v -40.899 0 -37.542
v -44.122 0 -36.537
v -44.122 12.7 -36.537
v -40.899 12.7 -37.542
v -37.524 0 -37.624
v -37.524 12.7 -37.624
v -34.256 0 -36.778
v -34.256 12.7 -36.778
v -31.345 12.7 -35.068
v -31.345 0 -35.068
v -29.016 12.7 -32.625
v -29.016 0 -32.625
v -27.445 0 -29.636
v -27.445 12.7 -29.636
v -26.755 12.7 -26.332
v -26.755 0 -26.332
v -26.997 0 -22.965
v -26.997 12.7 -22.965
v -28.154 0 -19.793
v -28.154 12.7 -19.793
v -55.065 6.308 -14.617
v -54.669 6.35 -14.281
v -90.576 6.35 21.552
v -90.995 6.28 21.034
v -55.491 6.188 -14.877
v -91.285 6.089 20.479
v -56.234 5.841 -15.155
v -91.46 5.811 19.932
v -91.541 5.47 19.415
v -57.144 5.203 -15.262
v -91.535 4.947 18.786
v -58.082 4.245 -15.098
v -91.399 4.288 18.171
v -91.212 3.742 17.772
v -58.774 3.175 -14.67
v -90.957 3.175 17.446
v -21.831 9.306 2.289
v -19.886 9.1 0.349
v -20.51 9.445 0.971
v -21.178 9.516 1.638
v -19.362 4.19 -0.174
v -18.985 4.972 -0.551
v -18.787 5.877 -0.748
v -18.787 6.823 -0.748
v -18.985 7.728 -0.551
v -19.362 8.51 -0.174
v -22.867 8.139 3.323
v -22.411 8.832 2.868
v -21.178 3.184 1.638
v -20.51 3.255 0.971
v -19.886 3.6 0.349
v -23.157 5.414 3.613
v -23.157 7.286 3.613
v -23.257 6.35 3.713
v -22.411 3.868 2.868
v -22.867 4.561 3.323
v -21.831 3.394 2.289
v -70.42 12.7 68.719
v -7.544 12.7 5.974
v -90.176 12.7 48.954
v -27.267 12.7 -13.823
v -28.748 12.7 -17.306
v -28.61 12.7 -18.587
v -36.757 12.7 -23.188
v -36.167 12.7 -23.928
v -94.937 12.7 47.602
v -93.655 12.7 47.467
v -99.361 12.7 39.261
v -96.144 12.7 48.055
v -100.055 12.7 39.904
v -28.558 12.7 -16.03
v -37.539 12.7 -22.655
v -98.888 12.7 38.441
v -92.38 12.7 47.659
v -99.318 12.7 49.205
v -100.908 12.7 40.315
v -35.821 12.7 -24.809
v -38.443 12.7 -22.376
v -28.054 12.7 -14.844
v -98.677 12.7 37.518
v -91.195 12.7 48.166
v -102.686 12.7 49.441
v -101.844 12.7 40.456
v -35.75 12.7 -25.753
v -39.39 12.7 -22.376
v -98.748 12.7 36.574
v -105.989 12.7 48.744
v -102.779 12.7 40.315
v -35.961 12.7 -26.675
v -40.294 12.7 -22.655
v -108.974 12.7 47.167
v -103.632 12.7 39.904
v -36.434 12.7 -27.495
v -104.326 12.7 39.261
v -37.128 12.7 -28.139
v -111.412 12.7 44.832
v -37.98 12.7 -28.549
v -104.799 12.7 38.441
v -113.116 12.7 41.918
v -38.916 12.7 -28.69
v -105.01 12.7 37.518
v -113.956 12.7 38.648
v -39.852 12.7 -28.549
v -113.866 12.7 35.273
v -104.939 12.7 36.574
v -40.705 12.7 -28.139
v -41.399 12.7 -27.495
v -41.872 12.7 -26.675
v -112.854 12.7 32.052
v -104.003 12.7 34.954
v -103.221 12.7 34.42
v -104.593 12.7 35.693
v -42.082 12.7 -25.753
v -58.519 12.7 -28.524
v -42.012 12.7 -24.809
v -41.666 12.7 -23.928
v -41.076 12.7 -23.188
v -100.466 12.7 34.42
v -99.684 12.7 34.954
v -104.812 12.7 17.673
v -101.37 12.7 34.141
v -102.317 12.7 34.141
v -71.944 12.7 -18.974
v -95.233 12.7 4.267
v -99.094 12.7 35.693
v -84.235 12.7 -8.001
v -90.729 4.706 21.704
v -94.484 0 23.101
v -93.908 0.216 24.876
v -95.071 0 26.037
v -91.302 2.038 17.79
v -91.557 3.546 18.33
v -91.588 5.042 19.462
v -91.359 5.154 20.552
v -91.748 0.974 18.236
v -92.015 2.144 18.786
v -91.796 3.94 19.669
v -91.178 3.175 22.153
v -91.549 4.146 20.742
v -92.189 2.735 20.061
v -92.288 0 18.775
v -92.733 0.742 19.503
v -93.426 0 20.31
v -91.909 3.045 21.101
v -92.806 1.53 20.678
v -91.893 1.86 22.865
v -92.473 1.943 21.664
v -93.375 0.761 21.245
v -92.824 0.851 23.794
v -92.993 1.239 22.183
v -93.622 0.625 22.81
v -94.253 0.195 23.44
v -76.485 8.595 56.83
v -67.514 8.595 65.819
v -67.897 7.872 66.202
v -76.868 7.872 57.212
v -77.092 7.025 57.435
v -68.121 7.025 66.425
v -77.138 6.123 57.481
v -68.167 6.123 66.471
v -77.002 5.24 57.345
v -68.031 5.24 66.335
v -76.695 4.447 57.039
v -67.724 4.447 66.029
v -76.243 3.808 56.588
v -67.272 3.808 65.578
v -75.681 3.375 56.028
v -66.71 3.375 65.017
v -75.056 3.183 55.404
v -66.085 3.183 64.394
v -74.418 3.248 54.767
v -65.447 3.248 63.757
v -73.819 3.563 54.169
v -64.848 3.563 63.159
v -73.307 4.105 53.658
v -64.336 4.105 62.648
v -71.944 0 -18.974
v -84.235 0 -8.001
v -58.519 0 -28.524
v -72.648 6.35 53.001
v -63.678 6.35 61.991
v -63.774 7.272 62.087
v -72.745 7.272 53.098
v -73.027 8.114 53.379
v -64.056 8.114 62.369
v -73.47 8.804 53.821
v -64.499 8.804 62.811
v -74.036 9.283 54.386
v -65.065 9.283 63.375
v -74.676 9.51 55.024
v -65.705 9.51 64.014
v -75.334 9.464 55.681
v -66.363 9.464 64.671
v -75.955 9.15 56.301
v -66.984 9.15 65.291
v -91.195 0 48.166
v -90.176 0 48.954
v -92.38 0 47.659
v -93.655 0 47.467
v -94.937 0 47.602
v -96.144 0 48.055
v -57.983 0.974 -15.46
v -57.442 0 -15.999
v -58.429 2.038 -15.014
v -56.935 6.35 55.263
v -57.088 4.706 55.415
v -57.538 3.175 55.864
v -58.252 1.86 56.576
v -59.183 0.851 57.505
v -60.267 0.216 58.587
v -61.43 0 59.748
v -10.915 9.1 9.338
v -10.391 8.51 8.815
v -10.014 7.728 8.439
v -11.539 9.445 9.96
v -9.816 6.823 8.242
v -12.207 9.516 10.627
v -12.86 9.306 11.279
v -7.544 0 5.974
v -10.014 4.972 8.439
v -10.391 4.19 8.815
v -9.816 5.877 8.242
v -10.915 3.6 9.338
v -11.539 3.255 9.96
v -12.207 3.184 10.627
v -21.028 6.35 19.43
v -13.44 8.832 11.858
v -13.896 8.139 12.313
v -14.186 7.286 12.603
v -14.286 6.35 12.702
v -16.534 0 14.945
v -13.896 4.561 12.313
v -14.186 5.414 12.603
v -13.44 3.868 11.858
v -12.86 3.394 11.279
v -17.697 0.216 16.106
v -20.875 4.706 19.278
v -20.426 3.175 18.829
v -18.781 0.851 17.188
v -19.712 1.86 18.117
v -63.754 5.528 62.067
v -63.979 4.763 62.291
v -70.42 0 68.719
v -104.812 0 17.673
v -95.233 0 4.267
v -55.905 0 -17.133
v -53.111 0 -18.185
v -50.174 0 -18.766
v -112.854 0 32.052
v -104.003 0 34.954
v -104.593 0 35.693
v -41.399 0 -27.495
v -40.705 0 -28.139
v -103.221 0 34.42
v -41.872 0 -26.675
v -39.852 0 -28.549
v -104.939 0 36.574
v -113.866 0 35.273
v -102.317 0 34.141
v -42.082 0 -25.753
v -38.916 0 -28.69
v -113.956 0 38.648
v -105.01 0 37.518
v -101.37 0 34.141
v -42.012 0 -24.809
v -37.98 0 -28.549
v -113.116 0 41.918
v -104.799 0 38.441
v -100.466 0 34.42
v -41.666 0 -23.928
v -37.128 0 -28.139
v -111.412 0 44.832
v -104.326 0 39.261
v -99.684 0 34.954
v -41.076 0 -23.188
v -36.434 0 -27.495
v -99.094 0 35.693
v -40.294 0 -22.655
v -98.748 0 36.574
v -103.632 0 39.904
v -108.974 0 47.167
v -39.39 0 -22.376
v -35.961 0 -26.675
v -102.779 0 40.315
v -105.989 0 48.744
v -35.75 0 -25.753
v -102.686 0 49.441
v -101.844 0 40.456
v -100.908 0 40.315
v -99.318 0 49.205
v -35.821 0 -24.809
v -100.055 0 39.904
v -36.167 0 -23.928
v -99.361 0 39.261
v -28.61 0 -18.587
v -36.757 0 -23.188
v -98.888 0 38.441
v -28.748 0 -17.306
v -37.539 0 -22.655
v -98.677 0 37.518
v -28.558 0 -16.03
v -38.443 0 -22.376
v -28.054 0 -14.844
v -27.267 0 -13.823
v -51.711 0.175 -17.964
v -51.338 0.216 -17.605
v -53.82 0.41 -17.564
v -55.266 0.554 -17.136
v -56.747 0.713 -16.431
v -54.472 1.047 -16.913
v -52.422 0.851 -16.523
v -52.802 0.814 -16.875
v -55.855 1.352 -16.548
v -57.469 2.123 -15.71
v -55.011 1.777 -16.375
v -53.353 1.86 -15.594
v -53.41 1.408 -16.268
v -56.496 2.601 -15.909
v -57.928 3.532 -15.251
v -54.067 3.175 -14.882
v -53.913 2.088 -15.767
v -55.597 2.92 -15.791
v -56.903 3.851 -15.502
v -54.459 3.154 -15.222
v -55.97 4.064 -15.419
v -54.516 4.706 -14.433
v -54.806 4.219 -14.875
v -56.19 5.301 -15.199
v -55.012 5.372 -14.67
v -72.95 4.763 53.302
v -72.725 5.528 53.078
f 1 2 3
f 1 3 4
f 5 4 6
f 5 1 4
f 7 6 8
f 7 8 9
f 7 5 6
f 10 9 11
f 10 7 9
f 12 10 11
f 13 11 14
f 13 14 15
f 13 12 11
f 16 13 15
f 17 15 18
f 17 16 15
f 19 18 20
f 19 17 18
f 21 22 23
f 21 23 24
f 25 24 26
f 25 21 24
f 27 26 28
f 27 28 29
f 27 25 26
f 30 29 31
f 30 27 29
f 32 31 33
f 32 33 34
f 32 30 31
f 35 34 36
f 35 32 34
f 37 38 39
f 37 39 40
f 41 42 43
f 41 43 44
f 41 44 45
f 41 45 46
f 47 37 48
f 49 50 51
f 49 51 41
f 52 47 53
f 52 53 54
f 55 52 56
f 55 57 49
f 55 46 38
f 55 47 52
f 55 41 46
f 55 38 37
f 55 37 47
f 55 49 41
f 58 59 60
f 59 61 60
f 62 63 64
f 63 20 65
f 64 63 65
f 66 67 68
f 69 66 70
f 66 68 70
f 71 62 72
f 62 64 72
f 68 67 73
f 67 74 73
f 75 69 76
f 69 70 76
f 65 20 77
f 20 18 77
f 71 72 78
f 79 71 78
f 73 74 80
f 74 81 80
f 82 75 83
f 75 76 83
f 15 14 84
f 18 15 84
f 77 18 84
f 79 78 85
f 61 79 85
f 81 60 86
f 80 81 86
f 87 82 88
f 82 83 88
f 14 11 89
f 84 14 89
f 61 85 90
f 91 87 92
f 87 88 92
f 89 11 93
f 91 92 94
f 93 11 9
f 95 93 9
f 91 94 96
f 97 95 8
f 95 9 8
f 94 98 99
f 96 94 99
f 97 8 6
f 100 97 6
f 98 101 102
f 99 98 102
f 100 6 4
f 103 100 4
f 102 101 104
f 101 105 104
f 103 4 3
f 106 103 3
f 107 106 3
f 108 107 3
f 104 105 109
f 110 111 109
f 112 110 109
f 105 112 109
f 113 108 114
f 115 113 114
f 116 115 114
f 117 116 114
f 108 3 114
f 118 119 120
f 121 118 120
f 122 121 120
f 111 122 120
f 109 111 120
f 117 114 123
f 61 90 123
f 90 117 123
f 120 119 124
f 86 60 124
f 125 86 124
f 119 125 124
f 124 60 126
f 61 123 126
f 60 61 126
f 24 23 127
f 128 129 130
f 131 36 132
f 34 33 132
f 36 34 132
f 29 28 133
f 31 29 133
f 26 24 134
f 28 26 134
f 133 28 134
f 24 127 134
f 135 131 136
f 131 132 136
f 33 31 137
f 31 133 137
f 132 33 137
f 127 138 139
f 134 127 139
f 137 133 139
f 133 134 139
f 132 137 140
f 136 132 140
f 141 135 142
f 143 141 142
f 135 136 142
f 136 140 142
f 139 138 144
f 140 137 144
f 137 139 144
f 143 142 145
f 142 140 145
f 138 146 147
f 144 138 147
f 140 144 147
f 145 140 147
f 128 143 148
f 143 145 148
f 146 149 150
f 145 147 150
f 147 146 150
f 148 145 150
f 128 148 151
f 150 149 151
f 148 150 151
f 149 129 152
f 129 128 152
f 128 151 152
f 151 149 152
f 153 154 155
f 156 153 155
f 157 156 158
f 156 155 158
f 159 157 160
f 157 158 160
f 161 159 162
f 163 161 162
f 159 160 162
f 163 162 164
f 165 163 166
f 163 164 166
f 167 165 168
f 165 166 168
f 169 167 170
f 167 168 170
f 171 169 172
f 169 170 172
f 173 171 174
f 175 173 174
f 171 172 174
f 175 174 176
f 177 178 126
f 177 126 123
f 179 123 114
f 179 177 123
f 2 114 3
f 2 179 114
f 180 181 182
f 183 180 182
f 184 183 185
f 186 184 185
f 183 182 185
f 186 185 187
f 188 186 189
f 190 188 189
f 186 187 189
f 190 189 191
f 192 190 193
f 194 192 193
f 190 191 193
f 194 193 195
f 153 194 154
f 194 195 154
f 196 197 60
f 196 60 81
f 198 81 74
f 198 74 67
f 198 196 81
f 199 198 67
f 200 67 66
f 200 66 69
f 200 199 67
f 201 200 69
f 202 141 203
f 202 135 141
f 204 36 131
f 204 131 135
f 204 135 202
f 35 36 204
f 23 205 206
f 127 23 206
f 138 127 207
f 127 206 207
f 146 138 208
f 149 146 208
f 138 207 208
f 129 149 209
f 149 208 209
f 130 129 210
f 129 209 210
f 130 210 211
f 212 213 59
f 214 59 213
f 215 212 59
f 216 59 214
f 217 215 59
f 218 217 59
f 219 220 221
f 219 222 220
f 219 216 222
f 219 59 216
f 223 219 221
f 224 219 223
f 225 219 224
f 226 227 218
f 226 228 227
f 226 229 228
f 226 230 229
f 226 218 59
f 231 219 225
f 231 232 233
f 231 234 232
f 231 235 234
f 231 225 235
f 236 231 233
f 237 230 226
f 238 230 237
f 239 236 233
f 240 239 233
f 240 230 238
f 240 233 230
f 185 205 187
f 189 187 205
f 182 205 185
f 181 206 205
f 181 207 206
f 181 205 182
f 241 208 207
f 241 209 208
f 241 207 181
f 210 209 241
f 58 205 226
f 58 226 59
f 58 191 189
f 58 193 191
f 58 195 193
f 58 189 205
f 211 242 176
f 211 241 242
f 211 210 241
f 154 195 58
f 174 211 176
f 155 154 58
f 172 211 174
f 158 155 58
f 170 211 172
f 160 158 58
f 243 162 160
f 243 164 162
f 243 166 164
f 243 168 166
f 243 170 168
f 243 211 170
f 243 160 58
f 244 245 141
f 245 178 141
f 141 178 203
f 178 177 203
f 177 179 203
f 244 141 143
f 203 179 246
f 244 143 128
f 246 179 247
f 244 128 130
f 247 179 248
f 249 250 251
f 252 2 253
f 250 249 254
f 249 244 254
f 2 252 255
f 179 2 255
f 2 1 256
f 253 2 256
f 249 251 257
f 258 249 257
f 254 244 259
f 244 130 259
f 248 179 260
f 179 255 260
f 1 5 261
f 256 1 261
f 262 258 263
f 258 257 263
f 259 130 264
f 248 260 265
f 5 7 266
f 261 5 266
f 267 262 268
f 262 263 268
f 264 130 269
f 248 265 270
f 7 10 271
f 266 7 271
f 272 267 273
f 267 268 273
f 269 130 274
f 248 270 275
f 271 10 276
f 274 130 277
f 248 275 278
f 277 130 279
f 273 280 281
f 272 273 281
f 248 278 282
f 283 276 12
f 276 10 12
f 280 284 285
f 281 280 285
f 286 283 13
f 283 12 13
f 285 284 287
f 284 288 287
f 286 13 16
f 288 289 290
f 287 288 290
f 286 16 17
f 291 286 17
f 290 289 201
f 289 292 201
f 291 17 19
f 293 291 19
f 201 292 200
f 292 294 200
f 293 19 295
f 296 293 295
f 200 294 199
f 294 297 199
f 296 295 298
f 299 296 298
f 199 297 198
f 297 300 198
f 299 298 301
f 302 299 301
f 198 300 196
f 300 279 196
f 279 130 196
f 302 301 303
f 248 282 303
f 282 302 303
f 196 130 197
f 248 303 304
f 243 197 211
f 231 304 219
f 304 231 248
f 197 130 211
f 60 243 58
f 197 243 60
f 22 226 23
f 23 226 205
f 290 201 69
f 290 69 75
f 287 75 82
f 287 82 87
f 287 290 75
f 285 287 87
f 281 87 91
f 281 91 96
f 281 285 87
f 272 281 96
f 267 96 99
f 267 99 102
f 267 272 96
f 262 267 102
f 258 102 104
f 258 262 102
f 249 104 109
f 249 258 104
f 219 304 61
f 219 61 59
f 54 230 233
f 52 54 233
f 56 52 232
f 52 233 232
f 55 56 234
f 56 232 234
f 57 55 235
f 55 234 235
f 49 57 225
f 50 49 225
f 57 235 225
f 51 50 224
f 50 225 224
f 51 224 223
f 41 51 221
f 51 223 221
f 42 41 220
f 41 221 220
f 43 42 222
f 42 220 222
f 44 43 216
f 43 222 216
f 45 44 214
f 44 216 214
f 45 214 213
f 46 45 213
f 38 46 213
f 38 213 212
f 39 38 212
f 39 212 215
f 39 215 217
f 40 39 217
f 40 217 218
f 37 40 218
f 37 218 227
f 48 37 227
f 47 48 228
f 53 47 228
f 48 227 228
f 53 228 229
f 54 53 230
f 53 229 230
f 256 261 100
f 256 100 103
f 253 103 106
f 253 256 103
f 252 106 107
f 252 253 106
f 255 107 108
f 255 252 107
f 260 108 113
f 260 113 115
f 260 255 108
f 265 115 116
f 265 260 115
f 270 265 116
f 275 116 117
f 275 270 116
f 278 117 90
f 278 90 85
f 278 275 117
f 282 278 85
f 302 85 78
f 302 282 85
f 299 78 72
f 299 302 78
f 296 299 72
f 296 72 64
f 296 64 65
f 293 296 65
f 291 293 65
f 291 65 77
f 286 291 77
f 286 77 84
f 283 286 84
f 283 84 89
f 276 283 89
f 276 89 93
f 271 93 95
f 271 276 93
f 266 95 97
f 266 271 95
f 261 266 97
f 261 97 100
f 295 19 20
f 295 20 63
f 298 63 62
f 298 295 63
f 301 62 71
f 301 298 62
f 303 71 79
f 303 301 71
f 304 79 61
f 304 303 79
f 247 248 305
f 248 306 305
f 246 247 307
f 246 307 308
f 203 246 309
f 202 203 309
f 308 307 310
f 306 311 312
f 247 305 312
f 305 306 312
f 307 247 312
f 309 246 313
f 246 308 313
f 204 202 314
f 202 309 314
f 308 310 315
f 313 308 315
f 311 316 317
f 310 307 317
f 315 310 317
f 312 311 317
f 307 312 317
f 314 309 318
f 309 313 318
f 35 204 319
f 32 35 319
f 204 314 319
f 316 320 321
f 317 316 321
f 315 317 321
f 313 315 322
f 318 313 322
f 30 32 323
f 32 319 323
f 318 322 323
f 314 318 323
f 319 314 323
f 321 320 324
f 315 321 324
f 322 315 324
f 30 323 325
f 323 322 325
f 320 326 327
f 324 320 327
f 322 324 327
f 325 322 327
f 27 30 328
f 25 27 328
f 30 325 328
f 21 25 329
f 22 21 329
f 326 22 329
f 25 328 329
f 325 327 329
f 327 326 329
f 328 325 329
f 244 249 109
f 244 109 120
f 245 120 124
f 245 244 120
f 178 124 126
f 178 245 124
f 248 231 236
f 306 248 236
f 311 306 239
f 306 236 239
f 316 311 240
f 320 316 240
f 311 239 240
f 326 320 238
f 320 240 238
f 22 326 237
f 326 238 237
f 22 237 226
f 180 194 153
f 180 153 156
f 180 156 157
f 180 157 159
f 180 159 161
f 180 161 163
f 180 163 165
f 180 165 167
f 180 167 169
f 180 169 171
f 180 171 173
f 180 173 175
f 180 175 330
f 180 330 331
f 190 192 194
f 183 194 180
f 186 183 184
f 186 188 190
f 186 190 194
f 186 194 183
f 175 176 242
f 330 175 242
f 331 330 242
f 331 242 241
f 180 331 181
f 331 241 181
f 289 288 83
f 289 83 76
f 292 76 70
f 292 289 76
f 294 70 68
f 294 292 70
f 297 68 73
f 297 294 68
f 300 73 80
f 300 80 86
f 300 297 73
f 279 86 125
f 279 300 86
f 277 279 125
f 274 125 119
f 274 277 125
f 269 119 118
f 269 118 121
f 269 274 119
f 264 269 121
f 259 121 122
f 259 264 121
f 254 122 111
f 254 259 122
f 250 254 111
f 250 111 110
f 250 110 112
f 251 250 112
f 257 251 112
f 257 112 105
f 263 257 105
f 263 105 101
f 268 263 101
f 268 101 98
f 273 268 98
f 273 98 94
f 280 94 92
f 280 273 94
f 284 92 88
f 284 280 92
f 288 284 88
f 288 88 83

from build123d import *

# Parameters (mm, degrees)
SKETCH10_R                   = 3.175
BOSS_EXTRUDE1_DEPTH          = 12.7
SKETCH13_R                   = 3.175
TAPPED_HOLE_FOR_LID_DEPTH    = 12.7
CUT_TO_DECREASE_MASS_DEPTH   = 50.8
EIGTH_INCH_INTERNAL_FILLET_R = 3.175


with BuildPart() as part:
    # Sketch10 → Boss-Extrude1 (new body)
    with BuildSketch(Plane(origin=(0, 0, 0), x_dir=(1, 0, 0), z_dir=(0, 1, 0))):
        with BuildLine():
            Line((-7.543952838, -5.974068145), (-70.419757016, -68.718954232))
            Line((-70.419757016, -68.718954232), (-90.175514458, -48.954289951))
            ThreePointArc((-90.175514458, -48.954289951), (-93.011705319, -47.522259817), (-96.143902741, -48.0552028))
            ThreePointArc((-96.143902741, -48.0552028), (-110.274094487, -46.08424648), (-112.854196125, -32.052494517))
            ThreePointArc((-112.854196125, -32.052494517), (-100.207656711, -10.837422412), (-84.235041656, 8.001096953))
            ThreePointArc((-84.235041656, 8.001096953), (-65.363270894, 23.934411483), (-44.121885218, 36.536704058))
            ThreePointArc((-44.121885218, 36.536704058), (-30.095541538, 33.92736112), (-28.154041586, 19.79309193))
            ThreePointArc((-28.154041586, 19.79309193), (-28.693511967, 16.662012146), (-27.267396522, 13.822842611))
            Line((-27.267396522, 13.822842611), (-7.543952838, -5.974068145))
        make_face()
        with Locations(Location((-101.843613637, -37.280998562, 0), (0, 0, 270))):
            Circle(SKETCH10_R, mode=Mode.SUBTRACT)
        with Locations(Location((-38.9163423, 25.515247521, 0), (0, 0, 90))):
            Circle(SKETCH10_R, mode=Mode.SUBTRACT)
    extrude(amount=BOSS_EXTRUDE1_DEPTH)

    # Sketch13 → Tapped Hole for Lid (cut)
    with BuildSketch(Plane(origin=(-0.777086764, 0, -0.778708166), x_dir=(0.7078433221233256, 0, -0.7063694722490589), z_dir=(0.7063694722490589, 0, 0.7078433221233256))):
        with BuildLine():
            ThreePointArc((-88.862126184, 6.35), (-90.822106286, 9.283317516), (-94.282190214, 8.59506403))
            Line((-94.282190214, 8.59506403), (-89.792062153, 4.10493597))
            ThreePointArc((-89.792062153, 4.10493597), (-89.103808668, 5.134980102), (-88.862126184, 6.35))
        make_face()
        with BuildLine():
            Line((-89.792062153, 4.10493597), (-94.282190214, 8.59506403))
            ThreePointArc((-94.282190214, 8.59506403), (-94.282190214, 4.10493597), (-89.792062153, 4.10493597))
        make_face()
        with Locations(Location((-15.909836001, 6.35, 0), (0, 0, 180))):
            Circle(SKETCH13_R)
    extrude(amount=-TAPPED_HOLE_FOR_LID_DEPTH, mode=Mode.SUBTRACT)

    # Sketch14 → Cut to Decrease Mass (cut)
    with BuildSketch(Plane(origin=(-0.777086764, 0, -0.778708166), x_dir=(0.7078433221233256, 0, -0.7063694722490589), z_dir=(0.7063694722490589, 0, 0.7078433221233256))):
        with BuildLine():
            ThreePointArc((-79.337126184, 6.35), (-81.196998123, 1.859871939), (-85.687126184, 0))
            Line((-85.687126184, 0), (-22.259836001, 0))
            ThreePointArc((-22.259836001, 0), (-26.749964062, 1.859871939), (-28.609836001, 6.35))
            Line((-28.609836001, 6.35), (-79.337126184, 6.35))
        make_face()
    extrude(amount=-CUT_TO_DECREASE_MASS_DEPTH, mode=Mode.SUBTRACT)

    # Eigth Inch Internal Fillet
    # the kernel refuses this fillet: 3.175 mm, written as the material it adds along each edge
    with BuildSketch(Plane(origin=(-52.417132219, 6.35, -21.013480322), x_dir=(0.6718444169056685, -0.3148458040869803, -0.670445522858871), z_dir=(0.22286149992151785, 0.9491428341660821, -0.22239746447275088))) as eigth_inch_internal_fillet_piece_1_section:
        with BuildLine():
            CenterArc((6.35 + EIGTH_INCH_INTERNAL_FILLET_R, -EIGTH_INCH_INTERNAL_FILLET_R), EIGTH_INCH_INTERNAL_FILLET_R, 90, 90)
            Line((6.35 + EIGTH_INCH_INTERNAL_FILLET_R, 0), (6.35, 0))
            Line((6.35, 0), (6.35, -EIGTH_INCH_INTERNAL_FILLET_R))
        make_face()
    eigth_inch_internal_fillet_piece_1 = revolve(axis=Axis((-52.417132219, 6.35, -21.013480322), (-0.7063694722490589, 0, -0.7078433221233256)), revolution_arc=161.648494619, mode=Mode.PRIVATE)
    eigth_inch_internal_fillet_piece_1 = split(eigth_inch_internal_fillet_piece_1, bisect_by=Plane(origin=(-55.789501587, 0, -16.604615259), z_dir=(0, 1, 0)), keep=Keep.TOP, mode=Mode.PRIVATE)
    add(eigth_inch_internal_fillet_piece_1)
    with BuildSketch(Plane(origin=(-97.313716015, 6.35, 23.789621171), x_dir=(0.7078433221233247, 0, -0.7063694722490598), z_dir=(0, 1, 0))) as eigth_inch_internal_fillet_piece_2_section:
        with BuildLine():
            CenterArc((6.35 + EIGTH_INCH_INTERNAL_FILLET_R, -EIGTH_INCH_INTERNAL_FILLET_R), EIGTH_INCH_INTERNAL_FILLET_R, 90, 90)
            Line((6.35 + EIGTH_INCH_INTERNAL_FILLET_R, 0), (6.35, 0))
            Line((6.35, 0), (6.35, -EIGTH_INCH_INTERNAL_FILLET_R))
        make_face()
    eigth_inch_internal_fillet_piece_2 = revolve(axis=Axis((-97.313716015, 6.35, 23.789621171), (-0.7063694722490589, 0, -0.7078433221233256)), revolution_arc=161.648494619, mode=Mode.PRIVATE)
    eigth_inch_internal_fillet_piece_2 = split(eigth_inch_internal_fillet_piece_2, bisect_by=Plane(origin=(-92.897831362, 0, 20.426448518), z_dir=(0, 1, 0)), keep=Keep.TOP, mode=Mode.PRIVATE)
    add(eigth_inch_internal_fillet_piece_2)
    with BuildSketch(Plane(origin=(-51.293430945, 6.35, -22.134841859), x_dir=(0.7063694722490589, 0, 0.7078433221233255), z_dir=(-0.7078433221233256, 0, 0.7063694722490589))) as eigth_inch_internal_fillet_piece_3:
        with BuildLine():
            CenterArc((EIGTH_INCH_INTERNAL_FILLET_R, -EIGTH_INCH_INTERNAL_FILLET_R), EIGTH_INCH_INTERNAL_FILLET_R, 90, 90)
            Line((0, -EIGTH_INCH_INTERNAL_FILLET_R), (0, 0))
            Line((0, 0), (EIGTH_INCH_INTERNAL_FILLET_R, 0))
        make_face()
    extrude(amount=66.602290182)


solid = part.part
